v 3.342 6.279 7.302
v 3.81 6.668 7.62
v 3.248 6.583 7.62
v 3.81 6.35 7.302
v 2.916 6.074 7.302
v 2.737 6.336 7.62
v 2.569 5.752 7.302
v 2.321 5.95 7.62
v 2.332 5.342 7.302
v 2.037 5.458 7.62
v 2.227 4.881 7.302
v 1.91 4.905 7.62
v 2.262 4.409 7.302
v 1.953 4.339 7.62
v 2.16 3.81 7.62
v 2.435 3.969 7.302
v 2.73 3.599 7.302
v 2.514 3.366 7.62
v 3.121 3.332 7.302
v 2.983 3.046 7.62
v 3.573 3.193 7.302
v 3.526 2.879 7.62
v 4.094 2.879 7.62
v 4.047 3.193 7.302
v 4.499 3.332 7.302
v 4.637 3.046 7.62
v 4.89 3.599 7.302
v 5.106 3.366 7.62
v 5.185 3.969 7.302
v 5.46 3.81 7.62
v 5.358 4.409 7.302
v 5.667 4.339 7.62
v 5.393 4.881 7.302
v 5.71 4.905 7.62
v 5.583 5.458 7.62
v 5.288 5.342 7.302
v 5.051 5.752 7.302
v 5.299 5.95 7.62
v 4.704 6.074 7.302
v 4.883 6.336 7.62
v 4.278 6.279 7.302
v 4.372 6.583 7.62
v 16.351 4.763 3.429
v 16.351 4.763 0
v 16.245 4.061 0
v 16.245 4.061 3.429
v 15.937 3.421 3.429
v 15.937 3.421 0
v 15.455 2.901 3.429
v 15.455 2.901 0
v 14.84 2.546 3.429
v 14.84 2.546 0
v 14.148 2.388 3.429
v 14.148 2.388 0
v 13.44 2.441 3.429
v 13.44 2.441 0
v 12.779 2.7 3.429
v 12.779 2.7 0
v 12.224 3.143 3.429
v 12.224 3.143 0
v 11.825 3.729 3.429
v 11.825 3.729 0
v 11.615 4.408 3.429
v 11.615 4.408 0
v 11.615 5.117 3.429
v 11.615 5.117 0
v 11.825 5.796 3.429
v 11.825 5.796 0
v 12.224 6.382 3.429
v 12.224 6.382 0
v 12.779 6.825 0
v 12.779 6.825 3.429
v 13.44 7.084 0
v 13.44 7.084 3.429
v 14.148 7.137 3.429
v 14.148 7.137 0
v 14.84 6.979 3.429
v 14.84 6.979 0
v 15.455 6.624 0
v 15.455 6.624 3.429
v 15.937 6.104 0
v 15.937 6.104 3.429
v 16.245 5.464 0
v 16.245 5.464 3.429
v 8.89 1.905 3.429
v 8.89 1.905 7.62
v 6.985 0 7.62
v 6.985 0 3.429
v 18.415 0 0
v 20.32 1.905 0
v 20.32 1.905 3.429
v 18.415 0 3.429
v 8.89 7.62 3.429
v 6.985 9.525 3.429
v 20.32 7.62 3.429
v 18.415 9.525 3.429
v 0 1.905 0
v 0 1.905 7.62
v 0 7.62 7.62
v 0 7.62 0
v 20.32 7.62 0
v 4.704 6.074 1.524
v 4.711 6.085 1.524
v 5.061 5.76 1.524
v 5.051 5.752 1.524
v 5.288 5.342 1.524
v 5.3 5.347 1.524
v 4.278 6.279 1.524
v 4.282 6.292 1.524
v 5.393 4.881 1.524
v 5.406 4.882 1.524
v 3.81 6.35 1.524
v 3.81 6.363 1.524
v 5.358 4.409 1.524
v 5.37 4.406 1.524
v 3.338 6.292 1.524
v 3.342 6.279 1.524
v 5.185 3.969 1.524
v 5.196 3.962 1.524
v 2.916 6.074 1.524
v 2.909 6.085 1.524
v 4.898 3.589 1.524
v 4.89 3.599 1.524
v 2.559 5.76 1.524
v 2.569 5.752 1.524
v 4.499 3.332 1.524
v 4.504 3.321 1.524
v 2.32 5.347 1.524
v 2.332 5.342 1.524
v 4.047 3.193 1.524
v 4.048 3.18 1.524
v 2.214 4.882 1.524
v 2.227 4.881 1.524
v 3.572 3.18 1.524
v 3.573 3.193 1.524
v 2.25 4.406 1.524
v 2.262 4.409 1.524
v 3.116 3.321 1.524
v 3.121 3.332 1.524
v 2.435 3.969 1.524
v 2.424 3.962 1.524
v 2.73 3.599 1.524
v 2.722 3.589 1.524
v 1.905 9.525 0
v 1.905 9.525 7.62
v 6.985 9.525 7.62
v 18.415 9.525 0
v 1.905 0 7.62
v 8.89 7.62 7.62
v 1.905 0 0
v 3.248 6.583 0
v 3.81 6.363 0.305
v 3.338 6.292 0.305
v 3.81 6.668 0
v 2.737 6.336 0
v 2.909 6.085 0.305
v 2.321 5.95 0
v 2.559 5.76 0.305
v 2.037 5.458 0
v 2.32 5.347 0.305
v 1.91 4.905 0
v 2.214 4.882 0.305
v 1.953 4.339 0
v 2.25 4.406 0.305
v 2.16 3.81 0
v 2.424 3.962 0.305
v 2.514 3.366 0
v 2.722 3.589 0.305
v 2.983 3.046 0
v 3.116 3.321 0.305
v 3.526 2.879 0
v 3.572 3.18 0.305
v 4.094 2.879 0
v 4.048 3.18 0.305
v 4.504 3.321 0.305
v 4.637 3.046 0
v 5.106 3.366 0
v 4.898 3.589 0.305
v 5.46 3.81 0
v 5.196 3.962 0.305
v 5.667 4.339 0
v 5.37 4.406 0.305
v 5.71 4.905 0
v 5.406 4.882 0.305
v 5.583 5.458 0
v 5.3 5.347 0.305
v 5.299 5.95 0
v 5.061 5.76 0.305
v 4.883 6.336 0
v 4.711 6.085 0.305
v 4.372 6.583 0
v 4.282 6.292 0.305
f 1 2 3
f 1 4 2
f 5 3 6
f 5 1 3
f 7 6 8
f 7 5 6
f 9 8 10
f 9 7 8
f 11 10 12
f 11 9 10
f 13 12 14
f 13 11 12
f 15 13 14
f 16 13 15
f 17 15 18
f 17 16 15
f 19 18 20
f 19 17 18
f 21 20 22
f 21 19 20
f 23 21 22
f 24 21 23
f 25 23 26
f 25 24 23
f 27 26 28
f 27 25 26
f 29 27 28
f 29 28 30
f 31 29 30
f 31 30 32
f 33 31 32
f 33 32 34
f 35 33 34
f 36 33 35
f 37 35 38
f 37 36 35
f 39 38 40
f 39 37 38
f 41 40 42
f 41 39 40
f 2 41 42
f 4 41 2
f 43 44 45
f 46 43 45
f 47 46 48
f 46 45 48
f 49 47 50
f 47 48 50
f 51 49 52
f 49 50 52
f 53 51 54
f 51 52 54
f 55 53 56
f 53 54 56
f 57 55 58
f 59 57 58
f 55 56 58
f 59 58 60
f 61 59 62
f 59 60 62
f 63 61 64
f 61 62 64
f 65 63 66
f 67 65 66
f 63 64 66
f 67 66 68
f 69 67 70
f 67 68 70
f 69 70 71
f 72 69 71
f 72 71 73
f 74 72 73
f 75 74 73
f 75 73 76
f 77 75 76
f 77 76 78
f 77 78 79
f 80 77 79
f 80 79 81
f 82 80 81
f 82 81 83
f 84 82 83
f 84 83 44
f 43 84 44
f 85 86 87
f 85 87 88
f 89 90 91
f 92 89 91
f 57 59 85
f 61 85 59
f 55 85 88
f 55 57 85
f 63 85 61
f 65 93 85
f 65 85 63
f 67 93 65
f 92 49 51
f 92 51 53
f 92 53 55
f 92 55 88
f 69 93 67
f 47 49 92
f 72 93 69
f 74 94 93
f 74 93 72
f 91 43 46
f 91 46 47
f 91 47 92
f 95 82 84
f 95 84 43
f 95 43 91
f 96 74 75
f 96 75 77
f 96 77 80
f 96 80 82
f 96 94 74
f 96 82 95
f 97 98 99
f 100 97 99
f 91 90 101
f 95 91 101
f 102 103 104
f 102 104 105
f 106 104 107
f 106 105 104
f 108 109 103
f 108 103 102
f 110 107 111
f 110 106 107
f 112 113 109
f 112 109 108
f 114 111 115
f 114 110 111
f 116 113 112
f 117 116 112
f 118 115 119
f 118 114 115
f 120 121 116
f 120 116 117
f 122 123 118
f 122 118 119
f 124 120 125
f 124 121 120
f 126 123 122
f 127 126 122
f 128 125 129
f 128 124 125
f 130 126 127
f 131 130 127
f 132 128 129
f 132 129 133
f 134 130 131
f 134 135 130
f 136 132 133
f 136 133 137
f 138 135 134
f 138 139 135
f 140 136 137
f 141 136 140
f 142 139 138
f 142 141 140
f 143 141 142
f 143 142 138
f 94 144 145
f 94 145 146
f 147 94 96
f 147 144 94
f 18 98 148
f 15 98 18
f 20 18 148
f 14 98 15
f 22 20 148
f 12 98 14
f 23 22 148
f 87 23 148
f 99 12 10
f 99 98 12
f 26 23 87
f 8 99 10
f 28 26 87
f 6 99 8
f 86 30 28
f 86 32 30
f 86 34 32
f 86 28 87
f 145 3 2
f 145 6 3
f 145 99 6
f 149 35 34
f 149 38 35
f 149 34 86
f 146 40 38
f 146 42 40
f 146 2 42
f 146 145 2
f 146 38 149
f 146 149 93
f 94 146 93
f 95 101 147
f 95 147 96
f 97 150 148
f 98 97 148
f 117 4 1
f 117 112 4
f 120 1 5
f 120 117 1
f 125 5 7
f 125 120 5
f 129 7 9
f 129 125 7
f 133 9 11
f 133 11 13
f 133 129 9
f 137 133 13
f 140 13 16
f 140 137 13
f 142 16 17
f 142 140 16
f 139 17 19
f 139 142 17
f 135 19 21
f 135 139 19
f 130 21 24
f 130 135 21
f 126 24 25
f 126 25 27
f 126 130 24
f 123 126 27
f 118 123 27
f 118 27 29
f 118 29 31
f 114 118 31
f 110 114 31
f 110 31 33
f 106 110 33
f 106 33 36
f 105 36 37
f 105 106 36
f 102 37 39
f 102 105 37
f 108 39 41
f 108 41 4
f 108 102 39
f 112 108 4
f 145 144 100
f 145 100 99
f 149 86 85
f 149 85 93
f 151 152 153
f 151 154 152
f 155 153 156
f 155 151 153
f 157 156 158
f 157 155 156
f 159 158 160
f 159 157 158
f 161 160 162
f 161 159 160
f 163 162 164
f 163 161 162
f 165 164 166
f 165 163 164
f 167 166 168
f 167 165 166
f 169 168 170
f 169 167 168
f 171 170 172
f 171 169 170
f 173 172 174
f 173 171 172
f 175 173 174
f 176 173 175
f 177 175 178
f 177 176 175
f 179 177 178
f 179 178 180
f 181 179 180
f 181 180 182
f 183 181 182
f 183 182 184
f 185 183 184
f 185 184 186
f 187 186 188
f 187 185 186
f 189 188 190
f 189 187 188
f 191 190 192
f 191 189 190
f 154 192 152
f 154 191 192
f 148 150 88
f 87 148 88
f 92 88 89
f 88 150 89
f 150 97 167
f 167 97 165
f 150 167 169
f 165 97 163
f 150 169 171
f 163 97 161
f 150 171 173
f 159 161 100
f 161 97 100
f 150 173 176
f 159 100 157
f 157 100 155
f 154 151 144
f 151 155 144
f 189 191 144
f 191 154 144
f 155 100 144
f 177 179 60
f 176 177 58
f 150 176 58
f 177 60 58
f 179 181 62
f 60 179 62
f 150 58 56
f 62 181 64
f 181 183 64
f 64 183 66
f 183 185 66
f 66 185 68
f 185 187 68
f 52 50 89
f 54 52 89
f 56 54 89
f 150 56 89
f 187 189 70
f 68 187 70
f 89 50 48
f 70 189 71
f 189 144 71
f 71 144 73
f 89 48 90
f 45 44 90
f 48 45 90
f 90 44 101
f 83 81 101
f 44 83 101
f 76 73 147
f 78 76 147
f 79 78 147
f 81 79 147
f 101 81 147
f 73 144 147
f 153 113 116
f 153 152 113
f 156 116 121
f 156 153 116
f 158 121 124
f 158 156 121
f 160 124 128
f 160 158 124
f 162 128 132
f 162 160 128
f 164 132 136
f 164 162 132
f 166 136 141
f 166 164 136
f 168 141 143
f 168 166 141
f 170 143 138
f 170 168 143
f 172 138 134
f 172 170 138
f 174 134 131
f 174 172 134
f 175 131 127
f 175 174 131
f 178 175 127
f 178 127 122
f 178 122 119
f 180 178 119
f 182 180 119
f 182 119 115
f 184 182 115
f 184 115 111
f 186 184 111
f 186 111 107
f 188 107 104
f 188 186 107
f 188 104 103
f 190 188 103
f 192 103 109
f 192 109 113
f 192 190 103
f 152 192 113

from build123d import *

# Parameters (mm, degrees)
SKETCH1_W                      = 20.32
SKETCH1_H                      = 9.525
EXTRUDE1_DEPTH                 = 7.62
F_3_16_0_1875_DIAMETER_HOLE1_D = 4.7625
SKETCH4_W                      = 11.43
SKETCH4_H                      = 9.525
EXTRUDE2_DEPTH                 = 4.191
CHAMFER1_SIZE                  = 1.905


with BuildPart() as part:
    # Sketch1 → Extrude1 (new body)
    with BuildSketch(Plane.XY):
        with Locations((10.16, 4.7625)):
            Rectangle(SKETCH1_W, SKETCH1_H)
    extrude(amount=EXTRUDE1_DEPTH)

    # 3/16 (0.1875) Diameter Hole1 (through all)
    with Locations(Plane(origin=(4.042308369, -0.495150795, 7.62), x_dir=(-1, 0, 0), z_dir=(0, 0, 1))):
        with Locations((-9.927691631, -5.257650795)):
            Hole(F_3_16_0_1875_DIAMETER_HOLE1_D / 2)

    # Sketch4 → Extrude2 (cut)
    with BuildSketch(Plane.XY.offset(7.62)):
        with Locations((14.605, 4.7625)):
            Rectangle(SKETCH4_W, SKETCH4_H)
    extrude(amount=-EXTRUDE2_DEPTH, mode=Mode.SUBTRACT)

    # Chamfer1
    chamfer1_edges = [part.edges().sort_by_distance(p)[0] for p in [
        (20.32, 9.525, 1.7145),
        (20.32, 0, 1.7145),
        (8.89, 9.525, 5.5245),
        (8.89, 0, 5.5245),
        (0, 9.525, 3.81),
        (0, 0, 3.81),
    ]]
    chamfer(chamfer1_edges, length=CHAMFER1_SIZE)

    # Sketch5 → CBORE for #4 Socket Head Cap Screw1 (revolve, cut)
    with BuildSketch(Plane(origin=(3.81, 4.7625, 0), x_dir=(0, 1, 0), z_dir=(1, 0, 0))):
        Polygon((0, 0), (0, 7.62), (1.905, 7.62), (1.5875, 7.3025), (1.5875, 1.524), (1.6002, 1.524), (1.6002, 0.3048), (1.905, 0), align=None)
    revolve(axis=Axis((3.81, 4.7625, -6.35), (0, 0, 1)), mode=Mode.SUBTRACT)


solid = part.part
